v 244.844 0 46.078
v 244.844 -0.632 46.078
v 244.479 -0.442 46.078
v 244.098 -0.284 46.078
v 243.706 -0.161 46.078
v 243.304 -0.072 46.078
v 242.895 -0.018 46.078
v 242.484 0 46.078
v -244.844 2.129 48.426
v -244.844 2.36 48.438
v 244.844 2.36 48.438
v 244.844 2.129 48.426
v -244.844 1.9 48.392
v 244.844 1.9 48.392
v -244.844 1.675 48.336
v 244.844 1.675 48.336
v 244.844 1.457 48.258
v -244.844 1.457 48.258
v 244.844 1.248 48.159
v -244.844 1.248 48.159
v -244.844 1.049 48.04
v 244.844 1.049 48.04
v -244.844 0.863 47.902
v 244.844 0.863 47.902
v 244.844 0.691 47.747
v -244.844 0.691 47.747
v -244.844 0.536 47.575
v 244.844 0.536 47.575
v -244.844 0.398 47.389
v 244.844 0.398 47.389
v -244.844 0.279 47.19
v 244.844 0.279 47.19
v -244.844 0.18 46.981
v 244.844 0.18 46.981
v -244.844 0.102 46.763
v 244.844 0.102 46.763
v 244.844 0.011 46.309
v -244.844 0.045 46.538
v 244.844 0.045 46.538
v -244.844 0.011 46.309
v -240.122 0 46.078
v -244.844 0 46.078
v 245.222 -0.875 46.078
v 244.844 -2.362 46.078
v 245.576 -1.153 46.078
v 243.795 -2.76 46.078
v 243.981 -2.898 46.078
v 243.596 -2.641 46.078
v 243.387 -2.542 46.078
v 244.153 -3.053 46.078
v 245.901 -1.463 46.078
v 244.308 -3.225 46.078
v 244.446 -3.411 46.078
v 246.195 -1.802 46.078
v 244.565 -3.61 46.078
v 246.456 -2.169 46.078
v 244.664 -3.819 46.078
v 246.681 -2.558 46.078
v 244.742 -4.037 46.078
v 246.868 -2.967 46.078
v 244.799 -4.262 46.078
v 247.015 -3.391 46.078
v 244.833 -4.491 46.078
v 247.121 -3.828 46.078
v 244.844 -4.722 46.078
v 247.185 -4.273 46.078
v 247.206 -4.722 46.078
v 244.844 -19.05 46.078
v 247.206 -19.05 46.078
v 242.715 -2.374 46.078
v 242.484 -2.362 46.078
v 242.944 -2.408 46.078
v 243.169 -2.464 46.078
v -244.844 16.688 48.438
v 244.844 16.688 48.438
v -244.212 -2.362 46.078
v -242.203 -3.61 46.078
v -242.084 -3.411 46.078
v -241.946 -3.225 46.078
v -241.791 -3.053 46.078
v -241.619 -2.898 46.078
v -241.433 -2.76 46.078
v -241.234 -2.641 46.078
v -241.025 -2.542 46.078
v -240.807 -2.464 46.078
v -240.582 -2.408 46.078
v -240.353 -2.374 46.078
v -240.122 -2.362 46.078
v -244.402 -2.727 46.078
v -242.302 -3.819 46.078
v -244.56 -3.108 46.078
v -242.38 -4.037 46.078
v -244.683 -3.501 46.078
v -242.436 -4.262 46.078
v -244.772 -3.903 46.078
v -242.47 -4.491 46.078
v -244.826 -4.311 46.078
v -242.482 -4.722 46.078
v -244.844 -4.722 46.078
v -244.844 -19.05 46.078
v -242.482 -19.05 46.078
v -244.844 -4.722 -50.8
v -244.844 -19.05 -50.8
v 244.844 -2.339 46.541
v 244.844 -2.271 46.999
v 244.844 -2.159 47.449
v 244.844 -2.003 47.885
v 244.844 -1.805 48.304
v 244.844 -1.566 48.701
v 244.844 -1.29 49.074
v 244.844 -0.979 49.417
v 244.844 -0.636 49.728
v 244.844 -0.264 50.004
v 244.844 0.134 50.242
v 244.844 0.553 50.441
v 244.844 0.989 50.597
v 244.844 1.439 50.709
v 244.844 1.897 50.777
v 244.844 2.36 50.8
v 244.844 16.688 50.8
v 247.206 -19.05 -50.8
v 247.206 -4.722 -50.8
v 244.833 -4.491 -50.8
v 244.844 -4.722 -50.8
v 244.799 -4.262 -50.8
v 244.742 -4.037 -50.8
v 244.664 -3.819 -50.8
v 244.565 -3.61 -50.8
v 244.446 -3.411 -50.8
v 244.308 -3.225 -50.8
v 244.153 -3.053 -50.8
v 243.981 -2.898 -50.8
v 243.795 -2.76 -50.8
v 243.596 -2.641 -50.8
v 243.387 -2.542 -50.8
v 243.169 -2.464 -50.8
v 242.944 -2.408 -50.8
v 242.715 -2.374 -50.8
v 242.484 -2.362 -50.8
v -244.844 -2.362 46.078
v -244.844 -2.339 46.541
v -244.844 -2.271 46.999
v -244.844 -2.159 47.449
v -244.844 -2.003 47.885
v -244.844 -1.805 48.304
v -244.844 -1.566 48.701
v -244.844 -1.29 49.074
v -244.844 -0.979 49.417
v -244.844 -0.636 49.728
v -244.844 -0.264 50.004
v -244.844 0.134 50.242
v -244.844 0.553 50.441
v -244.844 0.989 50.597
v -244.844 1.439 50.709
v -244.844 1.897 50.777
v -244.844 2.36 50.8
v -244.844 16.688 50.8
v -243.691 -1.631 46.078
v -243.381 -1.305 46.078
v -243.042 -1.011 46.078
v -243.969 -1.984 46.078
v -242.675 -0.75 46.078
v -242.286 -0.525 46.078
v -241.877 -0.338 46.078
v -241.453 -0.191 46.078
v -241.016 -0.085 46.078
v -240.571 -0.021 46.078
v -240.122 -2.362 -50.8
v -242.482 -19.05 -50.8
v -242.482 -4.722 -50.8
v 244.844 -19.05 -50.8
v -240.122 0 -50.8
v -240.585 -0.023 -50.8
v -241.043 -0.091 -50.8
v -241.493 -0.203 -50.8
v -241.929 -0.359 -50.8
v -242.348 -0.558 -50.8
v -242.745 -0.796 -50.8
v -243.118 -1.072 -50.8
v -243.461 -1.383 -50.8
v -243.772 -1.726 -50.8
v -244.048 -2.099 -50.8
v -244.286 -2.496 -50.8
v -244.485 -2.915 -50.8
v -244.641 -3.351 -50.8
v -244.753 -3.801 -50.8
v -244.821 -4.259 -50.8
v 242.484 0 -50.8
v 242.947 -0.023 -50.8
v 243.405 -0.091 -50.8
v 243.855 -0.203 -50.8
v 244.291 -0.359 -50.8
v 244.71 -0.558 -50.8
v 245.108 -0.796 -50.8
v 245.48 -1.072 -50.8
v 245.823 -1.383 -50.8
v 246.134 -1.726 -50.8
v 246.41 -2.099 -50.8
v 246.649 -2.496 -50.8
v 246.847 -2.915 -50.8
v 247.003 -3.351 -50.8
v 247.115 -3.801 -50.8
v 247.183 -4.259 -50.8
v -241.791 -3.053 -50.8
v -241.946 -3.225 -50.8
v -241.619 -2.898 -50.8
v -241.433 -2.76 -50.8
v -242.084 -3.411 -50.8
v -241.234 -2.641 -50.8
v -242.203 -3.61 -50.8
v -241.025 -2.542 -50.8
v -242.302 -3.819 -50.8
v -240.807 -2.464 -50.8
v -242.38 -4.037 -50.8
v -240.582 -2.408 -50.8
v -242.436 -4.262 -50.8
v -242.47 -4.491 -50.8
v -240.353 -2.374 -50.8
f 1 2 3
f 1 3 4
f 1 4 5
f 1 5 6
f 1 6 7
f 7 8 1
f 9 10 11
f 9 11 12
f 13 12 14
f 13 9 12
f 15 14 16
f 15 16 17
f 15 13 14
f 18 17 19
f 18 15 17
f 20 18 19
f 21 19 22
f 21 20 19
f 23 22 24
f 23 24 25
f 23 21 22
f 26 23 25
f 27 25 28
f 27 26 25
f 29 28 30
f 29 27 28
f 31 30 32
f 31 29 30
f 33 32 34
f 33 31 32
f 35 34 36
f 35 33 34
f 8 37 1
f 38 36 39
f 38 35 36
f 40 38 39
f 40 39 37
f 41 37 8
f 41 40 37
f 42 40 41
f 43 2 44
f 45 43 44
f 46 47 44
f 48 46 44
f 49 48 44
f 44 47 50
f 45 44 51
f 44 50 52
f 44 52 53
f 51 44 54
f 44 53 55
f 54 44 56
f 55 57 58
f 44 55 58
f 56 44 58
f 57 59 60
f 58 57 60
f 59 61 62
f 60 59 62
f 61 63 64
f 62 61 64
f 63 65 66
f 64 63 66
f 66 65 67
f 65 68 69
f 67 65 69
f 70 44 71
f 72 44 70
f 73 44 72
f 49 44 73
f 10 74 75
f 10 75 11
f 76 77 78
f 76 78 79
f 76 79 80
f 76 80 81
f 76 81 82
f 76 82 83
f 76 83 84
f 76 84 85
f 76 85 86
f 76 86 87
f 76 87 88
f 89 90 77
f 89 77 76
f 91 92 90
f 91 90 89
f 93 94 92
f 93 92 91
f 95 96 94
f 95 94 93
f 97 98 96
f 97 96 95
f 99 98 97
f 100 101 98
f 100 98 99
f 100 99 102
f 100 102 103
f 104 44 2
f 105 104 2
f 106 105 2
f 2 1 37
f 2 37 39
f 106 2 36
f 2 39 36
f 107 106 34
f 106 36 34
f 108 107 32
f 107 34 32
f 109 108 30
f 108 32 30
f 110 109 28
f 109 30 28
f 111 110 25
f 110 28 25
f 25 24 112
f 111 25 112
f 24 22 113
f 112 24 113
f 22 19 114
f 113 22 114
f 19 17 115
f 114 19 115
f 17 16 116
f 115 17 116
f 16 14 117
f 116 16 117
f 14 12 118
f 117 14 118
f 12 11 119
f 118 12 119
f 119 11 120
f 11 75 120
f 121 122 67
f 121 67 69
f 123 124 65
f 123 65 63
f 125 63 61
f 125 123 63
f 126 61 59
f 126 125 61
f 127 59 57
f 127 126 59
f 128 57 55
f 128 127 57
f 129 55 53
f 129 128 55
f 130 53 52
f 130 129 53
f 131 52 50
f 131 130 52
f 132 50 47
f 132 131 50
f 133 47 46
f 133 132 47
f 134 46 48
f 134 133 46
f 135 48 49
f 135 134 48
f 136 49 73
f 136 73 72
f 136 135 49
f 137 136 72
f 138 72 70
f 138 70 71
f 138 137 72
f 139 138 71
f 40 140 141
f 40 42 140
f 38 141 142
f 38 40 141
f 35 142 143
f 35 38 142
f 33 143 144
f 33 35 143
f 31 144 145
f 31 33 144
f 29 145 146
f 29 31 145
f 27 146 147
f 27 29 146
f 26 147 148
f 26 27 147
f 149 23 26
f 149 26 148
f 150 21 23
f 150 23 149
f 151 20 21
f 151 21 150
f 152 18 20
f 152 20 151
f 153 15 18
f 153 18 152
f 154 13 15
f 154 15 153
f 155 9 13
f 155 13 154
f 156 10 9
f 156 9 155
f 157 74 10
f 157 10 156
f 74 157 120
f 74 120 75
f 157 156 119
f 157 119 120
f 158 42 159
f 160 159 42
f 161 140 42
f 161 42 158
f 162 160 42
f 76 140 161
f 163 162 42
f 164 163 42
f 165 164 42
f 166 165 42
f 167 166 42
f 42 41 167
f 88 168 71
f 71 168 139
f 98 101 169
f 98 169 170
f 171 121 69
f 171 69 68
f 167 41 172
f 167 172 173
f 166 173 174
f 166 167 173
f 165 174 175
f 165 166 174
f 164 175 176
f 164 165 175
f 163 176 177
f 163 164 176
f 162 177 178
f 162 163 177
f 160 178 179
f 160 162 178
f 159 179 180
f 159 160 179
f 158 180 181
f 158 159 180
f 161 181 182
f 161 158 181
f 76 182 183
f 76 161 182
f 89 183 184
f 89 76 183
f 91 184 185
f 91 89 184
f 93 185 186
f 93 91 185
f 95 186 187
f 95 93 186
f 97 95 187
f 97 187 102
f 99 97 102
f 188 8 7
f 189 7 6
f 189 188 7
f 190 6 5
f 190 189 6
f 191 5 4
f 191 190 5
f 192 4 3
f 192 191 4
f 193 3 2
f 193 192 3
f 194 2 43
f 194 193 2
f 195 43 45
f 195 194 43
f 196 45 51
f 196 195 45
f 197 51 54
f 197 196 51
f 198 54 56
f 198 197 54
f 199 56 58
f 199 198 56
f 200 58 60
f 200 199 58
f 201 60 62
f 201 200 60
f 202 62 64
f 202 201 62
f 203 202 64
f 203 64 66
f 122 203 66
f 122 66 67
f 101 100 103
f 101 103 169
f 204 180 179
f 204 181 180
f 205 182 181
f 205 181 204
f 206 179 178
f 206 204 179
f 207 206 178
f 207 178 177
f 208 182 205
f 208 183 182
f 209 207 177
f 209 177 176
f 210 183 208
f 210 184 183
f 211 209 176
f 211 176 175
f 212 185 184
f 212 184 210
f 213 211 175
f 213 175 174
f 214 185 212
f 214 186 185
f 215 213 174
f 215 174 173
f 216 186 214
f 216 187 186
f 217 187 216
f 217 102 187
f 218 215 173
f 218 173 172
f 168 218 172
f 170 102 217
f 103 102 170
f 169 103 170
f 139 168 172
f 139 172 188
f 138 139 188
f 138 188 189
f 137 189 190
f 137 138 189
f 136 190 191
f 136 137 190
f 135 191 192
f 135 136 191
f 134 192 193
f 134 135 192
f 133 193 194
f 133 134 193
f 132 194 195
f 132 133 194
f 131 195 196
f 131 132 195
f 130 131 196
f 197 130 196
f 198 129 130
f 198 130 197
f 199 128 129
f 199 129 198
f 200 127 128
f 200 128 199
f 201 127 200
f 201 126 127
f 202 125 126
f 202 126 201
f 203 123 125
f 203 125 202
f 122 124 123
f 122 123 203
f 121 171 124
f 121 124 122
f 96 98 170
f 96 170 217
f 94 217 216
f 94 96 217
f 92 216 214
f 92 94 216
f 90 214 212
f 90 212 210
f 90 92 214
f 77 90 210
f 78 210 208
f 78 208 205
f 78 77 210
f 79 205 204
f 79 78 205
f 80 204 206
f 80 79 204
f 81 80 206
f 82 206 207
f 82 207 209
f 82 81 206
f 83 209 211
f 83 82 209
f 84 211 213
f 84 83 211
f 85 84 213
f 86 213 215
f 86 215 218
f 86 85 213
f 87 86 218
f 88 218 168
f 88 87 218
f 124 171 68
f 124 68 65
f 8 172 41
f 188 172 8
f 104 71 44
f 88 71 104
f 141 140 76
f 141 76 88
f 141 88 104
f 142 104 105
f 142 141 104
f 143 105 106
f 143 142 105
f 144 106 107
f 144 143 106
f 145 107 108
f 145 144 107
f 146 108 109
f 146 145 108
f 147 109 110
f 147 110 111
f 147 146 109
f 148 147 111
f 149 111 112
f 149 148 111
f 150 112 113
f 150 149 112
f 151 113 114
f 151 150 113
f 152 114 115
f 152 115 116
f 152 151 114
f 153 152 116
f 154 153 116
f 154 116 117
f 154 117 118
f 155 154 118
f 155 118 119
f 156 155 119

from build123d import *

# Parameters (mm, degrees)
SKETCH1_W                    = 489.688000048
SKETCH1_H                    = 101.6
BASE_FLANGE1_DEPTH           = 2.3622
EDGE_FLANGE1_STRIP_W         = 14.1688
EDGE_FLANGE1_STRIP_H         = 2.3622
EDGE_FLANGE1_STRIP_CUT_DEPTH = 489.688000048
EDGE_FLANGE1_DEPTH           = 489.688000048
EDGE_FLANGE2_STRIP_W         = 14.1688
EDGE_FLANGE2_STRIP_H         = 2.3622
EDGE_FLANGE2_STRIP_CUT_DEPTH = 96.8778
EDGE_FLANGE2_DEPTH           = 96.8778
EDGE_FLANGE3_STRIP_W         = 14.1688
EDGE_FLANGE3_STRIP_H         = 2.3622
EDGE_FLANGE3_STRIP_CUT_DEPTH = 96.8778
EDGE_FLANGE3_DEPTH           = 96.8778


# Sheet-metal steps are written as plain solids
with BuildPart() as part:
    # Sketch1 → Base-Flange1 (new body)
    with BuildSketch(Plane(origin=(0, 0, 0), x_dir=(1, 0, 0), z_dir=(0, 1, 0))):
        Rectangle(SKETCH1_W, SKETCH1_H)
    extrude(amount=-BASE_FLANGE1_DEPTH)

    # Edge-Flange1 strip (across the edge) → Edge-Flange1 strip cut (cut)
    with BuildSketch(Plane(origin=(-244.844000024, 0, 50.8), x_dir=(0, 0, -1), z_dir=(1, 0, 0))):
        with Locations((-2.3622, -1.1811)):
            Rectangle(EDGE_FLANGE1_STRIP_W, EDGE_FLANGE1_STRIP_H)
    extrude(amount=EDGE_FLANGE1_STRIP_CUT_DEPTH, mode=Mode.SUBTRACT)

    # Edge-Flange1 section (across the edge) → Edge-Flange1 (add)
    with BuildSketch(Plane(origin=(-244.844000024, 0, 50.8), x_dir=(0, 0, -1), z_dir=(1, 0, 0))):
        with BuildLine():
            Line((0, 2.36), (0, 16.6878))
            Line((0, 16.6878), (2.3622, 16.6878))
            Line((2.3622, 16.6878), (2.3622, 2.36))
            ThreePointArc((2.3622, 2.36), (3.053427996, 0.691227996), (4.7222, 0))
            Line((4.7222, 0), (4.7222, -2.3622))
            ThreePointArc((4.7222, -2.3622), (1.383100358, -0.979099642), (0, 2.36))
        make_face()
    extrude(amount=EDGE_FLANGE1_DEPTH)

    # Edge-Flange2 strip (across the edge) → Edge-Flange2 strip cut (cut)
    with BuildSketch(Plane(origin=(-244.844000024, -2.3622, 46.0778), x_dir=(1, 0, 0), z_dir=(0, 0, -1))):
        with Locations((-2.3622, -1.1811)):
            Rectangle(EDGE_FLANGE2_STRIP_W, EDGE_FLANGE2_STRIP_H)
    extrude(amount=EDGE_FLANGE2_STRIP_CUT_DEPTH, mode=Mode.SUBTRACT)

    # Edge-Flange2 section (across the edge) → Edge-Flange2 (add)
    with BuildSketch(Plane(origin=(-244.844000024, -2.3622, 46.0778), x_dir=(1, 0, 0), z_dir=(0, 0, -1))):
        with BuildLine():
            Line((0, 2.36), (0, 16.6878))
            Line((0, 16.6878), (2.3622, 16.6878))
            Line((2.3622, 16.6878), (2.3622, 2.36))
            ThreePointArc((2.3622, 2.36), (3.053427996, 0.691227996), (4.7222, 0))
            Line((4.7222, 0), (4.7222, -2.3622))
            ThreePointArc((4.7222, -2.3622), (1.383100358, -0.979099642), (0, 2.36))
        make_face()
    extrude(amount=EDGE_FLANGE2_DEPTH)

    # Edge-Flange3 strip (across the edge) → Edge-Flange3 strip cut (cut)
    with BuildSketch(Plane(origin=(244.844000024, -2.3622, -50.8), x_dir=(-1, 0, 0), z_dir=(0, 0, 1))):
        with Locations((-4.7244, -1.1811)):
            Rectangle(EDGE_FLANGE3_STRIP_W, EDGE_FLANGE3_STRIP_H)
    extrude(amount=EDGE_FLANGE3_STRIP_CUT_DEPTH, mode=Mode.SUBTRACT)

    # Edge-Flange3 section (across the edge) → Edge-Flange3 (add)
    with BuildSketch(Plane(origin=(244.844000024, -2.3622, -50.8), x_dir=(-1, 0, 0), z_dir=(0, 0, 1))):
        with BuildLine():
            Line((-2.3622, 2.36), (-2.3622, 16.6878))
            Line((-2.3622, 16.6878), (0, 16.6878))
            Line((0, 16.6878), (0, 2.36))
            ThreePointArc((0, 2.36), (0.691227996, 0.691227996), (2.36, 0))
            Line((2.36, 0), (2.36, -2.3622))
            ThreePointArc((2.36, -2.3622), (-0.979099642, -0.979099642), (-2.3622, 2.36))
        make_face()
    extrude(amount=EDGE_FLANGE3_DEPTH)


solid = part.part
